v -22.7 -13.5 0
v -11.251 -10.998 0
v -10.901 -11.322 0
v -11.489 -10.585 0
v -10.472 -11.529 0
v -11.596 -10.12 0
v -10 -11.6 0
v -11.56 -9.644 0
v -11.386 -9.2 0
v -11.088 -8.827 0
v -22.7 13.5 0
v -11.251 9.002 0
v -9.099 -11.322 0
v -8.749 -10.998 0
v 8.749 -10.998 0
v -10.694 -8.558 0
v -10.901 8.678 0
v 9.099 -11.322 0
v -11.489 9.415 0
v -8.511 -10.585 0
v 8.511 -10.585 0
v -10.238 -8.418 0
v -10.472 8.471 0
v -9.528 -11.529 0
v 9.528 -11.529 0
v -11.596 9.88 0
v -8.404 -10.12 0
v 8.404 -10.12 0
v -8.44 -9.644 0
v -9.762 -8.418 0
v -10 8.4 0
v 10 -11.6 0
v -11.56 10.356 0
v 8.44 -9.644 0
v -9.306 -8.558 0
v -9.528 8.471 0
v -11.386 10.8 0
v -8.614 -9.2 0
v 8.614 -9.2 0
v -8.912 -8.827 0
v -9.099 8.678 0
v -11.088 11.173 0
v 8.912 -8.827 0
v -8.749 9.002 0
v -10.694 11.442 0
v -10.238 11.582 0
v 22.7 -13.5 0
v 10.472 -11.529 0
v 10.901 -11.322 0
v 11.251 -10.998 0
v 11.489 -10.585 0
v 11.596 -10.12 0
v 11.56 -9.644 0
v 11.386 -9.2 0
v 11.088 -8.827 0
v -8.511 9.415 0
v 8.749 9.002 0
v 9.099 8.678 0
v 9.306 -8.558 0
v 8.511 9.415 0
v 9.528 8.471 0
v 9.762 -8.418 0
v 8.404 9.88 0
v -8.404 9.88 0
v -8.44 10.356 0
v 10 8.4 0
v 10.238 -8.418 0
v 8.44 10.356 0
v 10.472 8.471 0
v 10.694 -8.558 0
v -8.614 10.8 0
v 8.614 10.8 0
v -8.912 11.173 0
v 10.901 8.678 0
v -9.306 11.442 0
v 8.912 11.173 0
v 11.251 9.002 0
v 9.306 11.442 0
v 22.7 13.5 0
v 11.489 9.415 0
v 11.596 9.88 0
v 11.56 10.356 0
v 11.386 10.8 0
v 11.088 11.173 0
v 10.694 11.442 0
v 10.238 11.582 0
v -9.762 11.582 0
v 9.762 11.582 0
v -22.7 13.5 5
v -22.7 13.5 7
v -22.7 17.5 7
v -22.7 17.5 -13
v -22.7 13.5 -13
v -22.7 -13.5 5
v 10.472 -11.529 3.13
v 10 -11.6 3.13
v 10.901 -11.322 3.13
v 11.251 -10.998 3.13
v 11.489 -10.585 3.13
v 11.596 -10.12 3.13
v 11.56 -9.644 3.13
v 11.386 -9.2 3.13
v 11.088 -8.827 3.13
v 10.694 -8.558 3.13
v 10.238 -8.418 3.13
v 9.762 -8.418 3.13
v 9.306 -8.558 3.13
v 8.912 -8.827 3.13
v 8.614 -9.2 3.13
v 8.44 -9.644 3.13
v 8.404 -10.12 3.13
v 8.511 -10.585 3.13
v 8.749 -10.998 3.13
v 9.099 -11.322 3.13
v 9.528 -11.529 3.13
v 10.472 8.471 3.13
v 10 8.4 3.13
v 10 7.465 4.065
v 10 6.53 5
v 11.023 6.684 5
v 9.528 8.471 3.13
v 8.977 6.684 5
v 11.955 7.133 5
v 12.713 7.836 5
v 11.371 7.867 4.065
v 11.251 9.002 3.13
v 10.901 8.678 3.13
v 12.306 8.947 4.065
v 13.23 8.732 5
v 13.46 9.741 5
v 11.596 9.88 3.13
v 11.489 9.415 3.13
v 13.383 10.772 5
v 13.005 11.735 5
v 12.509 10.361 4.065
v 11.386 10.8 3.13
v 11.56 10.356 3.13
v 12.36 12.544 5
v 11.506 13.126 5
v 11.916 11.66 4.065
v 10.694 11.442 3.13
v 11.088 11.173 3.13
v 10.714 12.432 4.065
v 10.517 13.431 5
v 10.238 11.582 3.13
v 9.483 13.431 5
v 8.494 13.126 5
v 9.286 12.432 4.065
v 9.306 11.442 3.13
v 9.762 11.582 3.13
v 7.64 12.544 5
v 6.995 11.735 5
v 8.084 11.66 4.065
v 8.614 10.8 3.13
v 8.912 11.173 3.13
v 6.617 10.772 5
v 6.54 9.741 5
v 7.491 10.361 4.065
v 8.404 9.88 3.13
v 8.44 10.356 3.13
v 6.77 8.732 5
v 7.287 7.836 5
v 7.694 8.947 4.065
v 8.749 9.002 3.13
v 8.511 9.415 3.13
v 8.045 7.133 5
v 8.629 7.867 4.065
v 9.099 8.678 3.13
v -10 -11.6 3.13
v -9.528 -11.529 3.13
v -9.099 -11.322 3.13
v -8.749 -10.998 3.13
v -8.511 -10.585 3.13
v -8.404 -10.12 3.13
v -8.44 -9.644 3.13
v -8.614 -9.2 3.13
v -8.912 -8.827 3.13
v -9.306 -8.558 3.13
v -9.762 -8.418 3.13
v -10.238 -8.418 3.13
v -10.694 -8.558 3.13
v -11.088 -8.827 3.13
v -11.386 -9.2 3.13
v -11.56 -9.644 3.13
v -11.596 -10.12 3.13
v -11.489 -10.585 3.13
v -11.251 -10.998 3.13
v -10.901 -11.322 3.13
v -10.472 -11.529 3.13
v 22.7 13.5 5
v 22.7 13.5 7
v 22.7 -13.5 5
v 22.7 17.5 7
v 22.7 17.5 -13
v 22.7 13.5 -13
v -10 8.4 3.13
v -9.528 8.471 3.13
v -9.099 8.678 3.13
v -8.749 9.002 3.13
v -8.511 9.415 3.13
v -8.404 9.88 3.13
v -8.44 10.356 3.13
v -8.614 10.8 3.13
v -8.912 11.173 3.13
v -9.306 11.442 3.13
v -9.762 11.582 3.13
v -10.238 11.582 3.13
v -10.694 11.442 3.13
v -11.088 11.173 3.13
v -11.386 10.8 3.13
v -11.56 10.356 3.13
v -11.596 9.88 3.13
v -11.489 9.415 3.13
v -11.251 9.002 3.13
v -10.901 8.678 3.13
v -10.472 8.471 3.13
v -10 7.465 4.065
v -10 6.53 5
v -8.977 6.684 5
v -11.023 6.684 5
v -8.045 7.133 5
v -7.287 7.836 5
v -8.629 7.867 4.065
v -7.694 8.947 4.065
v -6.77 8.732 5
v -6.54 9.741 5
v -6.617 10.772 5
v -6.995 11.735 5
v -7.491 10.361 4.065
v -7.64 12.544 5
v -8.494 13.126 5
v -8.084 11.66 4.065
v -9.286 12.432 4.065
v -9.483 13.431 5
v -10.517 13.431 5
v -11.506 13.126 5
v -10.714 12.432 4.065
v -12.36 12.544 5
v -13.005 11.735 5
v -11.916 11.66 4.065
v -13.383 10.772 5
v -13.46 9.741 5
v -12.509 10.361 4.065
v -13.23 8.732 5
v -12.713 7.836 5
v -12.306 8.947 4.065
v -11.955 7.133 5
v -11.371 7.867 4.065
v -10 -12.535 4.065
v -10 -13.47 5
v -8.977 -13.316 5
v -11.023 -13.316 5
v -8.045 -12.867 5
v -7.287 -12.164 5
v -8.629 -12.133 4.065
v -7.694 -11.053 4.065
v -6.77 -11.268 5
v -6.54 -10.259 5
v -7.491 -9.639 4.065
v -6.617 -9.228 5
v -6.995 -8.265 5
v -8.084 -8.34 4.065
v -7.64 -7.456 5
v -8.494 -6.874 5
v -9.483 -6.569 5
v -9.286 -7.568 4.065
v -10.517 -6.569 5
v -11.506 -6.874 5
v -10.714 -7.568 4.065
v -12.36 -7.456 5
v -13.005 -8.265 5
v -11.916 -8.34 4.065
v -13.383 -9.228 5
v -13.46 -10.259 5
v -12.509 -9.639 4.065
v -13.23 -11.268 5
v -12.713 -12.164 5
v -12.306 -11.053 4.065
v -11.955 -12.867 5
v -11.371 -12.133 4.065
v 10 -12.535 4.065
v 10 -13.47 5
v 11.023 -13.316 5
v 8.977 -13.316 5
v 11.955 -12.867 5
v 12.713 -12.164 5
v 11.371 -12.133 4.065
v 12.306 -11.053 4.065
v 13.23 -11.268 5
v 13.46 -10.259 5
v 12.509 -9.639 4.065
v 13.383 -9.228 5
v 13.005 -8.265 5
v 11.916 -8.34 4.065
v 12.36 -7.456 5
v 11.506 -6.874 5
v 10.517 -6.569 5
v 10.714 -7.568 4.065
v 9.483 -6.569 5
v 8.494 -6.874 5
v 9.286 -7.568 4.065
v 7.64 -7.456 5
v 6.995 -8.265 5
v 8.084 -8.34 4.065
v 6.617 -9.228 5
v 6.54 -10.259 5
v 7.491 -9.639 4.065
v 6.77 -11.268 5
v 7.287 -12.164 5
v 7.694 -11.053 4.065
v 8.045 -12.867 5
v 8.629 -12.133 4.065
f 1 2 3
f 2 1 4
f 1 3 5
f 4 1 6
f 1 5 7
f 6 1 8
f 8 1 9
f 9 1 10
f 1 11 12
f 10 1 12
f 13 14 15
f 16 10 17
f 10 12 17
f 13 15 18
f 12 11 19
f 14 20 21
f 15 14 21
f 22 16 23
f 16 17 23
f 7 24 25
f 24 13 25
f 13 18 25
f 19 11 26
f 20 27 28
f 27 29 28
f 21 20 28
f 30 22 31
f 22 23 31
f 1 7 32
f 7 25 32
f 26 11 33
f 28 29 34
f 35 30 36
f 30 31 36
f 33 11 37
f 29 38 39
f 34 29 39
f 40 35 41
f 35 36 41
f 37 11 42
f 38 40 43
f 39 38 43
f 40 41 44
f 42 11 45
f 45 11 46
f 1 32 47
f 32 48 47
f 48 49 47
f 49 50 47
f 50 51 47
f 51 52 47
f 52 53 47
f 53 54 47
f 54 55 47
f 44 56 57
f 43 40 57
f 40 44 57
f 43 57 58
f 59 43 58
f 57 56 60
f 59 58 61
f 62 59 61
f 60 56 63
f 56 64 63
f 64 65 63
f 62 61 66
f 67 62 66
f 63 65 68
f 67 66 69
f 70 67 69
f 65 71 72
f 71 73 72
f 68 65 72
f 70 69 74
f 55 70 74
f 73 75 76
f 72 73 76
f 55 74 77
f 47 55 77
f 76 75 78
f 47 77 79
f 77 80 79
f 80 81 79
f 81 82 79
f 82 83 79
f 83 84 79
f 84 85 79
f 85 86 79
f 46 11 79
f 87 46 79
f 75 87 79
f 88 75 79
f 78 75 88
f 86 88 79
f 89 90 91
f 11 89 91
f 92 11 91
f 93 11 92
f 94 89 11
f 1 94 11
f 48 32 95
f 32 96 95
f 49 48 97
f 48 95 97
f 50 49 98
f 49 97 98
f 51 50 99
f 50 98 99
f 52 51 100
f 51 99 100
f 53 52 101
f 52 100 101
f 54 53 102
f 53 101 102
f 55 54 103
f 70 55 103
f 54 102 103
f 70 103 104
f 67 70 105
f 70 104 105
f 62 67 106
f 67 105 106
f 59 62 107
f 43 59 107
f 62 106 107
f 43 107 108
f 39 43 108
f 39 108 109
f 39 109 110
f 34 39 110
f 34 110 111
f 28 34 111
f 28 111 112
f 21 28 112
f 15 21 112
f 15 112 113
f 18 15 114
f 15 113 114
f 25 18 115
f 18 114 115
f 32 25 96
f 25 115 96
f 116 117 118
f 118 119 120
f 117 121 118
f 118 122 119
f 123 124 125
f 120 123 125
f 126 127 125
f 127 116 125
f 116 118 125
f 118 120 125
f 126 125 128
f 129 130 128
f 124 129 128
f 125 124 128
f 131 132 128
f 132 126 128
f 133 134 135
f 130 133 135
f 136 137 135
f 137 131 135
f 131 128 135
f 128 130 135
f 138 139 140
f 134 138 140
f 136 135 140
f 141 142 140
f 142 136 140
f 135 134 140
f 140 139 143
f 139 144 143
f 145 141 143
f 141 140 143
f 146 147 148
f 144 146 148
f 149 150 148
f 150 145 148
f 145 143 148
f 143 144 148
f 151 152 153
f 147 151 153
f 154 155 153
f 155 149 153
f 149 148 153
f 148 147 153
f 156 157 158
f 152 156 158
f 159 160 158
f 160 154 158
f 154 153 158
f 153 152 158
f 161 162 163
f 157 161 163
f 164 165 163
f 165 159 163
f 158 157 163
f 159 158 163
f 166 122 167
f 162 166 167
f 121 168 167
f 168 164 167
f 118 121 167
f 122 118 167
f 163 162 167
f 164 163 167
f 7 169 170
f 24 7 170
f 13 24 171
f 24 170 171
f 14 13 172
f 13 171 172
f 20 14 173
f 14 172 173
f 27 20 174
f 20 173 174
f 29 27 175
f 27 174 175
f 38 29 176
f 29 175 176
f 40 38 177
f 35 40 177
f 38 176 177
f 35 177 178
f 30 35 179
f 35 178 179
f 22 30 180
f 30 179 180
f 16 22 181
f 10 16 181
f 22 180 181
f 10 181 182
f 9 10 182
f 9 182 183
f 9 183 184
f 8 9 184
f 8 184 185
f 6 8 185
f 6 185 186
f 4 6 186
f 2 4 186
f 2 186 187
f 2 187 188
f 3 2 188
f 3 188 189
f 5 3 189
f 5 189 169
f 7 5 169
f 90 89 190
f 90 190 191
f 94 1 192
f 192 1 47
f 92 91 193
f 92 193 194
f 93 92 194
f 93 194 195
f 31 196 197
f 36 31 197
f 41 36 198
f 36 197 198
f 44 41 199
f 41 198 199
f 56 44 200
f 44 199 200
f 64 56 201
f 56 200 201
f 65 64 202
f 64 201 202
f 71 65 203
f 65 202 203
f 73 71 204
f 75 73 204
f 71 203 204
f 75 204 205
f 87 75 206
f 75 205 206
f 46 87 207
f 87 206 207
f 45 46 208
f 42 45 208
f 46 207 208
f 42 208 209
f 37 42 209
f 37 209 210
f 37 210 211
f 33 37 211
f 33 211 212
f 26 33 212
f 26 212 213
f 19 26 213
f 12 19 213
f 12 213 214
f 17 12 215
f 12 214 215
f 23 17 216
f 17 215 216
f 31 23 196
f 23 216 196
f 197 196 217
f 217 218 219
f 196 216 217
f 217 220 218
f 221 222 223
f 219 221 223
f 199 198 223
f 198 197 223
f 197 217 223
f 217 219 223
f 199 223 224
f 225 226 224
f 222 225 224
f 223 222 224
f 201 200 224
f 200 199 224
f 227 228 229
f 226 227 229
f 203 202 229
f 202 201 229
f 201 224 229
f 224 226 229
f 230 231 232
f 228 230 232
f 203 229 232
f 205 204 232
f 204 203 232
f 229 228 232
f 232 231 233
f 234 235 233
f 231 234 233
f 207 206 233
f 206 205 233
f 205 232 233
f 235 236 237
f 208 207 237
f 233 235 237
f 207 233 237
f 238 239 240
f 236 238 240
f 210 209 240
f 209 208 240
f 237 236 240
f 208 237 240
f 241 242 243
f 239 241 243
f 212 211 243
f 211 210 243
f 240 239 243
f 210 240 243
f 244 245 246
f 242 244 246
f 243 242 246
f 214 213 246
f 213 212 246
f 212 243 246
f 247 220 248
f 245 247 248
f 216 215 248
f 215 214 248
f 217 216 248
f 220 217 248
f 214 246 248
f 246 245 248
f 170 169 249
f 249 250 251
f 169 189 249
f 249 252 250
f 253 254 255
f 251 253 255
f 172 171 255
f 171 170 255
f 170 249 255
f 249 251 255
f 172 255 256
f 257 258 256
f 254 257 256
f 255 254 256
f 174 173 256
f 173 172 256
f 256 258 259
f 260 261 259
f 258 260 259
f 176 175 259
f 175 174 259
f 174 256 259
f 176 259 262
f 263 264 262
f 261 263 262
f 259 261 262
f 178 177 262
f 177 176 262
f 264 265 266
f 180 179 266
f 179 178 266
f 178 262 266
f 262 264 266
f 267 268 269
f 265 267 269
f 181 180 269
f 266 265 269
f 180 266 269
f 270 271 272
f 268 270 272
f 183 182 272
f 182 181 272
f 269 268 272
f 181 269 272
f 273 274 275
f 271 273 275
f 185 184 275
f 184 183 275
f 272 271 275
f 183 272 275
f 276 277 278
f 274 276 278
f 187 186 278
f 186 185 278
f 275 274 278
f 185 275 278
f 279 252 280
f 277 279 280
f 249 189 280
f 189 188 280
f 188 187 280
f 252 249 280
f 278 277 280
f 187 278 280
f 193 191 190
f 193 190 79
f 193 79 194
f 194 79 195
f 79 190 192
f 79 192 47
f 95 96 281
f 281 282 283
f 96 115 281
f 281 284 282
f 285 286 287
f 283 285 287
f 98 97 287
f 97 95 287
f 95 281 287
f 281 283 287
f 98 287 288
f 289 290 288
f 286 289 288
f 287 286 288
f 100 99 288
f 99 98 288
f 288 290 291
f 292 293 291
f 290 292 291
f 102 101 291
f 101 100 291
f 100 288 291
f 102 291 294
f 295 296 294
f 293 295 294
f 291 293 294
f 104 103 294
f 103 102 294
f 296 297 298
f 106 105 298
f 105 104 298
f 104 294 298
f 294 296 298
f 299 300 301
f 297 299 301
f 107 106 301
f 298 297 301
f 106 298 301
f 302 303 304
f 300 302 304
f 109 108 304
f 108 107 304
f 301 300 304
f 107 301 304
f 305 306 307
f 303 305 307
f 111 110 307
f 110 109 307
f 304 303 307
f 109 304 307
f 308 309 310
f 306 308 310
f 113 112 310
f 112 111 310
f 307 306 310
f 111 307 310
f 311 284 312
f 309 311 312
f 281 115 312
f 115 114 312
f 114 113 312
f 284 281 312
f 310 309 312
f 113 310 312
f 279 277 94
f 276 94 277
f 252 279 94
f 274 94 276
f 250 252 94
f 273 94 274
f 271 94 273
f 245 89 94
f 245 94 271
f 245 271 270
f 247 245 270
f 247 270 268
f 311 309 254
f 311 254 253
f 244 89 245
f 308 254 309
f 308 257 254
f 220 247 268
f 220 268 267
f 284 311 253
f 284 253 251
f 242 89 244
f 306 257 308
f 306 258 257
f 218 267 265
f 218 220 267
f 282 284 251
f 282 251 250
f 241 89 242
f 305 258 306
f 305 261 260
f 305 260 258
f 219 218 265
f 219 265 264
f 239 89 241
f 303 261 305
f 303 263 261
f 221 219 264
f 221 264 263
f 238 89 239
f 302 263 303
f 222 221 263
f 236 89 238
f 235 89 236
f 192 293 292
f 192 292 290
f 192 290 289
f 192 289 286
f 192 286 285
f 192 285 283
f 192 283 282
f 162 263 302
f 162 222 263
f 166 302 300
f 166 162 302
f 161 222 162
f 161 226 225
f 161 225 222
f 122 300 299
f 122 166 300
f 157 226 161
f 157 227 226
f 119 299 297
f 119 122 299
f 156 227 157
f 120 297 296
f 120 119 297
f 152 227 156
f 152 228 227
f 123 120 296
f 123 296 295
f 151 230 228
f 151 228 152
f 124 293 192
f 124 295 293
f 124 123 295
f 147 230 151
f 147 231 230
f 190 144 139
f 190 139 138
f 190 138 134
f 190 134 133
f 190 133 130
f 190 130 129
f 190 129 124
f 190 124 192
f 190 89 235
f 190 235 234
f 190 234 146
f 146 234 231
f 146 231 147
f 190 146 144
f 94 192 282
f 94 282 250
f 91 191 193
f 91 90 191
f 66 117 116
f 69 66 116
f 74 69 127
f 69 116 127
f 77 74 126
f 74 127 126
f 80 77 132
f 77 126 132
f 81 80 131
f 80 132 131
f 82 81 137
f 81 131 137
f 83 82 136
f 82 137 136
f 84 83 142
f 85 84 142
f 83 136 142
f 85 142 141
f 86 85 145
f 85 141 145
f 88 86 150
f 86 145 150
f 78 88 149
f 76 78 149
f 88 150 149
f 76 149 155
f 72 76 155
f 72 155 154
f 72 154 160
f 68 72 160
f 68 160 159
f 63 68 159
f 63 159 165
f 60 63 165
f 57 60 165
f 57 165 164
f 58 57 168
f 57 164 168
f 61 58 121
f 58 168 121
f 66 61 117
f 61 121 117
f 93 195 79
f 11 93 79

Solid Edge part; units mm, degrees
sketch "Sketch1" plane through (0, 0, 0) normal (0, 0, 1) x (1, 0, 0)
  line L0 (22.7, 13.5) -> (-22.7, 13.5)
  line L1 (-22.7, 13.5) -> (-22.7, -13.5)
  line L2 (-22.7, -13.5) -> (22.7, -13.5)
  line L3 (22.7, -13.5) -> (22.7, 13.5)
extrude "Protrusion1" add sketch "Sketch1" along normal blind 5
sketch "Sketch2" plane through (0, 0, 0) normal (1, 0, 0) x (0, 1, 0)
  line L0 (13.5, 7) -> (17.5, 7)
  line L1 (17.5, 7) -> (17.5, -13)
  line L2 (17.5, -13) -> (13.5, -13)
  line L3 (13.5, -13) -> (13.5, 7)
  dimension "D1" = 13
  dimension "D2" = 4
  dimension "D3" = 7
extrude "Protrusion2" add sketch "Sketch2" along normal mid plane 45.4
hole "Hole_1" at (-10, 10, 5) direction (0, 0, -1) diameter 3.2 end up to next countersink diameter 6.94 countersink angle 90
pattern_linear "Pattern1" count 2 spacing 20 along (1, 0, 0) count 2 spacing 20 along (0, -1, 0) of "Hole_1"
